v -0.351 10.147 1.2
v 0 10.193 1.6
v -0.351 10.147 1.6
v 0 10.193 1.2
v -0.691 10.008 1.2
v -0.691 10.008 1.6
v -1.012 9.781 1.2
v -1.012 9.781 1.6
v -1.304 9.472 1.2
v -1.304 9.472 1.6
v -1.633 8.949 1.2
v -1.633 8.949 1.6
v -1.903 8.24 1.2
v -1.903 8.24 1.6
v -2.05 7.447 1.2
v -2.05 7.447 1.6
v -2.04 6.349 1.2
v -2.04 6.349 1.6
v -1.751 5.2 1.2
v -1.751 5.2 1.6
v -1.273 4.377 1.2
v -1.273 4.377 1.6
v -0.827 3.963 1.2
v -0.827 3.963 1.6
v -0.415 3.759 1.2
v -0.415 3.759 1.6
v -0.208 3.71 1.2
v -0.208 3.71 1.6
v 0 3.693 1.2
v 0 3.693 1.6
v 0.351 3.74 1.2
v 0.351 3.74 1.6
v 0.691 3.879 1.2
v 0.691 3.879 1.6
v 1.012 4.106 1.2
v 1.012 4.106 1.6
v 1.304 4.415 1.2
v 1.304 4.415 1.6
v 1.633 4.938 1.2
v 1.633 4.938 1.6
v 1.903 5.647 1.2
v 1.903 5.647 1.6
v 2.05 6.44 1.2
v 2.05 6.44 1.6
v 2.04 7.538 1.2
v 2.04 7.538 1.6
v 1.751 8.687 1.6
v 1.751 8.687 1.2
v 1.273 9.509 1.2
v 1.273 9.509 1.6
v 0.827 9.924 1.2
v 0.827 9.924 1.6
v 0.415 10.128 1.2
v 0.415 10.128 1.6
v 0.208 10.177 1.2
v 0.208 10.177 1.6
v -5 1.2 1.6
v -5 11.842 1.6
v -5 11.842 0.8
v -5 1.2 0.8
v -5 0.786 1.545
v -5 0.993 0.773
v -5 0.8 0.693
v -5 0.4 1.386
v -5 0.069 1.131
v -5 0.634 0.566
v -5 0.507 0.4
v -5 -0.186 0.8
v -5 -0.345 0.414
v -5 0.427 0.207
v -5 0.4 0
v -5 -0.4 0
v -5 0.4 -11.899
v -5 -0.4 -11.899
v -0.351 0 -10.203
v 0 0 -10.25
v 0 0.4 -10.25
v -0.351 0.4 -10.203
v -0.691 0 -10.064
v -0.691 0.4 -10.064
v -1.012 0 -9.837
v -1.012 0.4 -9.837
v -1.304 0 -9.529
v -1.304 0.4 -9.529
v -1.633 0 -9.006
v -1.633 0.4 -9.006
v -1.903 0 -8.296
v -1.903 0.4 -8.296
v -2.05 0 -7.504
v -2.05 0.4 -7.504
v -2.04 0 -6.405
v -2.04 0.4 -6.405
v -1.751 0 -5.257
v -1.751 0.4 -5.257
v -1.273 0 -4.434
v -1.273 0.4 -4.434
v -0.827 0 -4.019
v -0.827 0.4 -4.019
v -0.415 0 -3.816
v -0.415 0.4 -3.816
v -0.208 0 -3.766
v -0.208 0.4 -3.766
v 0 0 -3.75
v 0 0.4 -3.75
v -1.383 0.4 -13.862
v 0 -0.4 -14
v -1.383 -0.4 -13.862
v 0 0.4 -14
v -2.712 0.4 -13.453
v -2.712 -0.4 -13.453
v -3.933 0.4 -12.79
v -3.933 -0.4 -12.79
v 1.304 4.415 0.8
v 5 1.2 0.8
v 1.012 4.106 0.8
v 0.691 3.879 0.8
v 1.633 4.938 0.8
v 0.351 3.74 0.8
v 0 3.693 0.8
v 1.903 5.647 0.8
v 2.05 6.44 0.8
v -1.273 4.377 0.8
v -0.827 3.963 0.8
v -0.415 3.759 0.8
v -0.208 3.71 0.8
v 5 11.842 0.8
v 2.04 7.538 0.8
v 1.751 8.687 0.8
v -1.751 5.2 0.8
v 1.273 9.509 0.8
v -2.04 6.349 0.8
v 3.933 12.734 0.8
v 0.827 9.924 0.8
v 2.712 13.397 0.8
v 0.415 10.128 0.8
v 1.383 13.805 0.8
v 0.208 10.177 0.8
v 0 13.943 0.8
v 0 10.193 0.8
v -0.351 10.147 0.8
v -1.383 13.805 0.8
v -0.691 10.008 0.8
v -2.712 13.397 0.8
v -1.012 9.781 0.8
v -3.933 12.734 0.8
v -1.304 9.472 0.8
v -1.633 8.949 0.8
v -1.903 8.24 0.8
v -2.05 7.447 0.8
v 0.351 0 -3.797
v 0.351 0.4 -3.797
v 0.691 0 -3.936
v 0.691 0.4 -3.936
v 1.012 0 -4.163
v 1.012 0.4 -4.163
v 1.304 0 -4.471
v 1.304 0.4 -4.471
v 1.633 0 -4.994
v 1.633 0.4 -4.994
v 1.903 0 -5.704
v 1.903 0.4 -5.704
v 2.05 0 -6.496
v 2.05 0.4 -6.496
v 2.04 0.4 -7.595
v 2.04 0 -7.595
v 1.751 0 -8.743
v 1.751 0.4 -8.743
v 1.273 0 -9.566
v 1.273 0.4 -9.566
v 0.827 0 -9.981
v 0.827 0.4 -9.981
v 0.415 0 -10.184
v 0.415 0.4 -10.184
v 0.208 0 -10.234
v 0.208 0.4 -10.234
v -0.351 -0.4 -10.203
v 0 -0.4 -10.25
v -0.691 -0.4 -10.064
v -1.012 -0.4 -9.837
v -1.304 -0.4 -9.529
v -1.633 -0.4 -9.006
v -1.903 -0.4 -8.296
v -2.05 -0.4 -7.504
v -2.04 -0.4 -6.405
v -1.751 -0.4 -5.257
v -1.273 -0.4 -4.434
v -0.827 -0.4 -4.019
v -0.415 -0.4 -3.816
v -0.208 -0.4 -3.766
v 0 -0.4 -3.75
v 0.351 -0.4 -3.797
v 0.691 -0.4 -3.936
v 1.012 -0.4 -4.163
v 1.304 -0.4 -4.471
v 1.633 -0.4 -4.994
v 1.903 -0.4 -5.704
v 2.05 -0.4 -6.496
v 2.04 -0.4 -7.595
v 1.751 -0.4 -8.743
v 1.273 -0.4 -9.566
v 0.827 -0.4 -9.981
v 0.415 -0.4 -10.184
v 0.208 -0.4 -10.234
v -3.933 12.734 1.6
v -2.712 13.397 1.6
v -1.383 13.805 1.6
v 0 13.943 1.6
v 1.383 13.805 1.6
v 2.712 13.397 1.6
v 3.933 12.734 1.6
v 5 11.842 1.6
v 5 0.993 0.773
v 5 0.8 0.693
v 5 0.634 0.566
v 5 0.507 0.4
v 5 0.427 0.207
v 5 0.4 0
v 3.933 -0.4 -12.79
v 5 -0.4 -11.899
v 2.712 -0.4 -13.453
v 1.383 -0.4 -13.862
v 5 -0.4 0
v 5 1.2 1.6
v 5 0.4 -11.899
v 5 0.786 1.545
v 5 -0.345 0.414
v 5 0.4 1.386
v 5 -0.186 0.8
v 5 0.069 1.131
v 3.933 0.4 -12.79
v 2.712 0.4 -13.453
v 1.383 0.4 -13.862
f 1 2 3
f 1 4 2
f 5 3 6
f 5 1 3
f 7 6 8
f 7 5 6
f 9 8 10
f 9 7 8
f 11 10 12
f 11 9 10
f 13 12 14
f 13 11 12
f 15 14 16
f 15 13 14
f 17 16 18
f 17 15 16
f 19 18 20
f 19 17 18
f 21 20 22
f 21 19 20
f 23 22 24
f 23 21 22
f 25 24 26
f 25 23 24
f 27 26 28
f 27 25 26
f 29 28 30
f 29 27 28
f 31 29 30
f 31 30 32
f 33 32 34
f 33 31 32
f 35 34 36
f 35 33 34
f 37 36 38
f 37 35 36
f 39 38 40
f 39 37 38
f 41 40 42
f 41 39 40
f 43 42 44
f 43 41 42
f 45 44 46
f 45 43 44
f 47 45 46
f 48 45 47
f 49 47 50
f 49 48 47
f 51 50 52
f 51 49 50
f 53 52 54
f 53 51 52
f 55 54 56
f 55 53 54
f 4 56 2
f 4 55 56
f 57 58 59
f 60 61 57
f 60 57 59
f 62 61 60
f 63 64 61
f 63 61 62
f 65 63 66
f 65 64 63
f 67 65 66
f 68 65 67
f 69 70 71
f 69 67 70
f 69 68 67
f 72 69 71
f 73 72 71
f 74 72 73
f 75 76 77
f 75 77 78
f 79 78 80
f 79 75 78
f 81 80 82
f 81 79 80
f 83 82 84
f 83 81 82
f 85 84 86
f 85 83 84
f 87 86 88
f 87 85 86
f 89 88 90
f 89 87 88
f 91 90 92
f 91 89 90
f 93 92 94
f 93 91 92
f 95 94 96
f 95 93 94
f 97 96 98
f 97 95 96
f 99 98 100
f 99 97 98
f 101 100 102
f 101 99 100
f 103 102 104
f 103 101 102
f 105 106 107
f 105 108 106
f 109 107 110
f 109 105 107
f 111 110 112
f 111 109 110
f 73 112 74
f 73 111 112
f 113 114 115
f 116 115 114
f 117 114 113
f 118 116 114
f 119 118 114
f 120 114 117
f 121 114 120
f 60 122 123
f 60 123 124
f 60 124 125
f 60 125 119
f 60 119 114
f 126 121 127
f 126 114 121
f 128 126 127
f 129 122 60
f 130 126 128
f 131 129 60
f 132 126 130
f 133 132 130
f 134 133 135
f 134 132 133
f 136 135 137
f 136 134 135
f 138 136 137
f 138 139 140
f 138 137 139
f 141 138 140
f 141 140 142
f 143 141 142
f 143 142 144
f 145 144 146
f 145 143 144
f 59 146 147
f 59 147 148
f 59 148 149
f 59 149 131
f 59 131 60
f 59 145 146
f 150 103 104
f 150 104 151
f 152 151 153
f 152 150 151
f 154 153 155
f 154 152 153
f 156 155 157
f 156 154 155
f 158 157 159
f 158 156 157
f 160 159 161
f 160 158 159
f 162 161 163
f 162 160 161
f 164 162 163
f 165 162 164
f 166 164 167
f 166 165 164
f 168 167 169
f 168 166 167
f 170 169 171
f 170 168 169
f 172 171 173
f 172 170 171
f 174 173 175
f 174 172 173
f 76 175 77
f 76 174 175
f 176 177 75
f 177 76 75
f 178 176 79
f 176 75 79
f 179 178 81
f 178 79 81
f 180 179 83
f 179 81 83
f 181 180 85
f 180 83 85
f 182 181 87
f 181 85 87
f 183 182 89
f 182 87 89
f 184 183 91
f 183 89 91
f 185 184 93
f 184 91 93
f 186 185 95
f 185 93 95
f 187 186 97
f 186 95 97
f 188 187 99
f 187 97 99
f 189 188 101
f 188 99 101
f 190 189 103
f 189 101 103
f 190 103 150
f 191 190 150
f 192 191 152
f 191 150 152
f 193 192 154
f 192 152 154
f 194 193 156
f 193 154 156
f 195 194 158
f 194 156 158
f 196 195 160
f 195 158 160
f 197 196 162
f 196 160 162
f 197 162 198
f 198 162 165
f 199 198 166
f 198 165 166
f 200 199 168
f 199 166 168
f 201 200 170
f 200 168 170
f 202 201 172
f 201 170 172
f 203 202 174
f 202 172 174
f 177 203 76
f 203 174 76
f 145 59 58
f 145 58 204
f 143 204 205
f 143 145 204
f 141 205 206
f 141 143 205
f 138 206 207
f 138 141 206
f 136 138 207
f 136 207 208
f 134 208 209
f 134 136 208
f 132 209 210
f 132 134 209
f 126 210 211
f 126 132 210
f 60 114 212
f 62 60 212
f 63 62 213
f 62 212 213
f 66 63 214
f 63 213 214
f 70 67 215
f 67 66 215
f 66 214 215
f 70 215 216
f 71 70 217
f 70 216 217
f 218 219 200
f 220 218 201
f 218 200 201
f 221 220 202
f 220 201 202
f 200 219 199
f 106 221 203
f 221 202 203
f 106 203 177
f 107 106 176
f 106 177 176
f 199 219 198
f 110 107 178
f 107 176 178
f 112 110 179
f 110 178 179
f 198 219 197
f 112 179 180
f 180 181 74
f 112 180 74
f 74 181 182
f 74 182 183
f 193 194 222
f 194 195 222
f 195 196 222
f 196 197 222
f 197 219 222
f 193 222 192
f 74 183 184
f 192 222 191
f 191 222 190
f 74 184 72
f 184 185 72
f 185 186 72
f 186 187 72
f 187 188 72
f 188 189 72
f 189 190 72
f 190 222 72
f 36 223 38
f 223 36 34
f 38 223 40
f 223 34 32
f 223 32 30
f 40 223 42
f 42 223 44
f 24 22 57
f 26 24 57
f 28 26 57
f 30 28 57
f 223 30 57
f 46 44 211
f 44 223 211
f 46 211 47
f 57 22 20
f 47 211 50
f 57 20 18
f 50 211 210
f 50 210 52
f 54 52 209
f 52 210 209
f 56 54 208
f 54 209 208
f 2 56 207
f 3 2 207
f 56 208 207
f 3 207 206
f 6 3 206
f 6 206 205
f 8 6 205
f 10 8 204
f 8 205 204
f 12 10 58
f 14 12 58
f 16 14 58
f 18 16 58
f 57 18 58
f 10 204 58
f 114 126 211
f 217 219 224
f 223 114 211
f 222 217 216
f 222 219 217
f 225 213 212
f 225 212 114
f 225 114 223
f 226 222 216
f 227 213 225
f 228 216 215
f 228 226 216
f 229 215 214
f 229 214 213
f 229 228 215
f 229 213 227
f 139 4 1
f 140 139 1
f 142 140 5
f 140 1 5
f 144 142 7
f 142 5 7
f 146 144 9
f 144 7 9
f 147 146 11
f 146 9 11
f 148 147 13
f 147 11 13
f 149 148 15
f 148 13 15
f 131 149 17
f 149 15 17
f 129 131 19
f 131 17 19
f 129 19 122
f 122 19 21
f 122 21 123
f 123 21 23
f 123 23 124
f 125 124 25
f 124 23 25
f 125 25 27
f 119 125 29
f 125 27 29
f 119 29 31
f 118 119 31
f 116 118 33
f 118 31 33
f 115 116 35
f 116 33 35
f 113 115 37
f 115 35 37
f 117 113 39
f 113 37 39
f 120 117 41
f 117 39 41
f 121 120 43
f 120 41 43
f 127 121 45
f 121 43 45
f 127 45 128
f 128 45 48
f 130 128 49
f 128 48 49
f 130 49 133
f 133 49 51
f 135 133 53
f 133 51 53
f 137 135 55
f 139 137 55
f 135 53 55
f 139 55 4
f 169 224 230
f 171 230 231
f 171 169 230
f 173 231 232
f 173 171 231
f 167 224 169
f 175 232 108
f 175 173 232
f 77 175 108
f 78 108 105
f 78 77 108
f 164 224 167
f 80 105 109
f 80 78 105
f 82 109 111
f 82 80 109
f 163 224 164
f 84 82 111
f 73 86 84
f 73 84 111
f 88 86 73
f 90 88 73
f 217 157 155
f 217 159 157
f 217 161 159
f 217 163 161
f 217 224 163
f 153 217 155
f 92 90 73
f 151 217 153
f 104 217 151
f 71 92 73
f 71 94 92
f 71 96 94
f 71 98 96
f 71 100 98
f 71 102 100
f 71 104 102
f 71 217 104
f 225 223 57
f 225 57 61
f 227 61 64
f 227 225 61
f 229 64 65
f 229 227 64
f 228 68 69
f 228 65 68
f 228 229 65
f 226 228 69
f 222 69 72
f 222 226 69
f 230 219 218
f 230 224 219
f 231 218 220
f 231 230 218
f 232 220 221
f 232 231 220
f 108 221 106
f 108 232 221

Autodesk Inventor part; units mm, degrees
ref_plane "YZ Plane" through (0, 0, 0) normal (1, 0, 0) x (0, 1, 0)
ref_plane "XZ Plane" through (0, 0, 0) normal (0, 1, 0) x (-1, 0, 0)
ref_plane "XY Plane" through (0, 0, 0) normal (0, 0, 1) x (1, 0, 0)
sketch "Эскиз1" plane through (0, 0, 0) normal (0, 1, 0) x (-1, 0, 0)
  line L0 (5, -14) -> (-5, -14)
  line L1 (-5, -14) -> (-5, 0)
  line L2 (-5, 0) -> (5, 0)
  line L3 (5, 0) -> (5, -14)
  line L4 (0, -10.25) -> (0, -3.75)
  line L5 (0, -14) -> (0, 0) construction
  ellipse E0 centre (0, -7) end of major axis (-2.075, -7) minor radius 3.25
  dimension "d5" = 2.075
  dimension "d0" = 14
  dimension "d1" = 10
  dimension "d4" = 6.5
extrude "Выдавливание1" add sketch "Эскиз1" along normal mid plane 0.8
mirror "Зеркальное отражение1" about plane through (0, 0, 0) normal (0, 0, 1) of "Выдавливание1"
sketch "Эскиз2" plane through (0, 0.4, 0) normal (0, 1, 0) x (1, 0, 0)
  point P0 (0, 0)
sketch "Эскиз3" plane through (0, 0.4, 0) normal (0, 1, 0) x (1, 0, 0)
  ellipse E0 centre (0, 7) end of major axis (0, 10.25) minor radius 2.075 projected
  line L0 (5, 14) -> (-5, 14) projected
  arc A0 (5, 11.899) -> (0, 14) centre (0, 7) ccw
  arc A1 (0, 14) -> (-5, 11.899) centre (0, 7) ccw
  line L1 (5, 14) -> (5, -14) projected
  line L2 (-5, 14) -> (-5, -14) projected
  line L3 (2.799, 0) -> (-2.799, 0) construction
  arc A2 (0, -14) -> (5, -11.899) centre (0, -7) ccw
  arc A3 (-5, -11.899) -> (0, -14) centre (0, -7) ccw
  line L4 (5, -14) -> (-5, -14) projected
  point P0 (0, 0)
  point P1 (0, 0)
  point P2 (5, -11.899)
extrude "Выдавливание2" cut sketch "Эскиз3" against normal up to surface (0.8 mm away) contours L1 A0 L0 | A1 L2 L0 | L1 L4 A2 | A3 L4 L2
sketch "Эскиз5" plane through (0, 0.4, 0) normal (0, 1, 0) x (1, 0, 0)
  line L0 (-5, 11.899) -> (-5, -11.899) projected
  line L1 (-5, 0) -> (5, 0)
  line L2 (5, 11.899) -> (5, -11.899) projected
  point P0 (0, 0)
bend part "Сгиб детали1" radius 0.8 angle 90 line through (-5, 0.4, 0) along (1, 0, 0) centre toward (0, 1, 0) moving side (0, 0, 1) both sides no
equation "\"Радиус_гибки\" = Толщина"
equation "\"Ширина_просечки\" = Толщина"
equation "\"Глубина_просечки\" = 0.5 * Толщина"
equation "\"Размер_просечки\" = 4 * Толщина"
equation "\"Мин_остаток\" = 2 * Толщина"
equation "\"Радиус_перехода\" = Радиус_гибки"
equation "\"Радиус_Якоби\" = Радиус_гибки"
equation "\"Размер_зазора\" = Толщина"
equation "\"Толщина\" = 0.8"
properties part number "Уголок"
